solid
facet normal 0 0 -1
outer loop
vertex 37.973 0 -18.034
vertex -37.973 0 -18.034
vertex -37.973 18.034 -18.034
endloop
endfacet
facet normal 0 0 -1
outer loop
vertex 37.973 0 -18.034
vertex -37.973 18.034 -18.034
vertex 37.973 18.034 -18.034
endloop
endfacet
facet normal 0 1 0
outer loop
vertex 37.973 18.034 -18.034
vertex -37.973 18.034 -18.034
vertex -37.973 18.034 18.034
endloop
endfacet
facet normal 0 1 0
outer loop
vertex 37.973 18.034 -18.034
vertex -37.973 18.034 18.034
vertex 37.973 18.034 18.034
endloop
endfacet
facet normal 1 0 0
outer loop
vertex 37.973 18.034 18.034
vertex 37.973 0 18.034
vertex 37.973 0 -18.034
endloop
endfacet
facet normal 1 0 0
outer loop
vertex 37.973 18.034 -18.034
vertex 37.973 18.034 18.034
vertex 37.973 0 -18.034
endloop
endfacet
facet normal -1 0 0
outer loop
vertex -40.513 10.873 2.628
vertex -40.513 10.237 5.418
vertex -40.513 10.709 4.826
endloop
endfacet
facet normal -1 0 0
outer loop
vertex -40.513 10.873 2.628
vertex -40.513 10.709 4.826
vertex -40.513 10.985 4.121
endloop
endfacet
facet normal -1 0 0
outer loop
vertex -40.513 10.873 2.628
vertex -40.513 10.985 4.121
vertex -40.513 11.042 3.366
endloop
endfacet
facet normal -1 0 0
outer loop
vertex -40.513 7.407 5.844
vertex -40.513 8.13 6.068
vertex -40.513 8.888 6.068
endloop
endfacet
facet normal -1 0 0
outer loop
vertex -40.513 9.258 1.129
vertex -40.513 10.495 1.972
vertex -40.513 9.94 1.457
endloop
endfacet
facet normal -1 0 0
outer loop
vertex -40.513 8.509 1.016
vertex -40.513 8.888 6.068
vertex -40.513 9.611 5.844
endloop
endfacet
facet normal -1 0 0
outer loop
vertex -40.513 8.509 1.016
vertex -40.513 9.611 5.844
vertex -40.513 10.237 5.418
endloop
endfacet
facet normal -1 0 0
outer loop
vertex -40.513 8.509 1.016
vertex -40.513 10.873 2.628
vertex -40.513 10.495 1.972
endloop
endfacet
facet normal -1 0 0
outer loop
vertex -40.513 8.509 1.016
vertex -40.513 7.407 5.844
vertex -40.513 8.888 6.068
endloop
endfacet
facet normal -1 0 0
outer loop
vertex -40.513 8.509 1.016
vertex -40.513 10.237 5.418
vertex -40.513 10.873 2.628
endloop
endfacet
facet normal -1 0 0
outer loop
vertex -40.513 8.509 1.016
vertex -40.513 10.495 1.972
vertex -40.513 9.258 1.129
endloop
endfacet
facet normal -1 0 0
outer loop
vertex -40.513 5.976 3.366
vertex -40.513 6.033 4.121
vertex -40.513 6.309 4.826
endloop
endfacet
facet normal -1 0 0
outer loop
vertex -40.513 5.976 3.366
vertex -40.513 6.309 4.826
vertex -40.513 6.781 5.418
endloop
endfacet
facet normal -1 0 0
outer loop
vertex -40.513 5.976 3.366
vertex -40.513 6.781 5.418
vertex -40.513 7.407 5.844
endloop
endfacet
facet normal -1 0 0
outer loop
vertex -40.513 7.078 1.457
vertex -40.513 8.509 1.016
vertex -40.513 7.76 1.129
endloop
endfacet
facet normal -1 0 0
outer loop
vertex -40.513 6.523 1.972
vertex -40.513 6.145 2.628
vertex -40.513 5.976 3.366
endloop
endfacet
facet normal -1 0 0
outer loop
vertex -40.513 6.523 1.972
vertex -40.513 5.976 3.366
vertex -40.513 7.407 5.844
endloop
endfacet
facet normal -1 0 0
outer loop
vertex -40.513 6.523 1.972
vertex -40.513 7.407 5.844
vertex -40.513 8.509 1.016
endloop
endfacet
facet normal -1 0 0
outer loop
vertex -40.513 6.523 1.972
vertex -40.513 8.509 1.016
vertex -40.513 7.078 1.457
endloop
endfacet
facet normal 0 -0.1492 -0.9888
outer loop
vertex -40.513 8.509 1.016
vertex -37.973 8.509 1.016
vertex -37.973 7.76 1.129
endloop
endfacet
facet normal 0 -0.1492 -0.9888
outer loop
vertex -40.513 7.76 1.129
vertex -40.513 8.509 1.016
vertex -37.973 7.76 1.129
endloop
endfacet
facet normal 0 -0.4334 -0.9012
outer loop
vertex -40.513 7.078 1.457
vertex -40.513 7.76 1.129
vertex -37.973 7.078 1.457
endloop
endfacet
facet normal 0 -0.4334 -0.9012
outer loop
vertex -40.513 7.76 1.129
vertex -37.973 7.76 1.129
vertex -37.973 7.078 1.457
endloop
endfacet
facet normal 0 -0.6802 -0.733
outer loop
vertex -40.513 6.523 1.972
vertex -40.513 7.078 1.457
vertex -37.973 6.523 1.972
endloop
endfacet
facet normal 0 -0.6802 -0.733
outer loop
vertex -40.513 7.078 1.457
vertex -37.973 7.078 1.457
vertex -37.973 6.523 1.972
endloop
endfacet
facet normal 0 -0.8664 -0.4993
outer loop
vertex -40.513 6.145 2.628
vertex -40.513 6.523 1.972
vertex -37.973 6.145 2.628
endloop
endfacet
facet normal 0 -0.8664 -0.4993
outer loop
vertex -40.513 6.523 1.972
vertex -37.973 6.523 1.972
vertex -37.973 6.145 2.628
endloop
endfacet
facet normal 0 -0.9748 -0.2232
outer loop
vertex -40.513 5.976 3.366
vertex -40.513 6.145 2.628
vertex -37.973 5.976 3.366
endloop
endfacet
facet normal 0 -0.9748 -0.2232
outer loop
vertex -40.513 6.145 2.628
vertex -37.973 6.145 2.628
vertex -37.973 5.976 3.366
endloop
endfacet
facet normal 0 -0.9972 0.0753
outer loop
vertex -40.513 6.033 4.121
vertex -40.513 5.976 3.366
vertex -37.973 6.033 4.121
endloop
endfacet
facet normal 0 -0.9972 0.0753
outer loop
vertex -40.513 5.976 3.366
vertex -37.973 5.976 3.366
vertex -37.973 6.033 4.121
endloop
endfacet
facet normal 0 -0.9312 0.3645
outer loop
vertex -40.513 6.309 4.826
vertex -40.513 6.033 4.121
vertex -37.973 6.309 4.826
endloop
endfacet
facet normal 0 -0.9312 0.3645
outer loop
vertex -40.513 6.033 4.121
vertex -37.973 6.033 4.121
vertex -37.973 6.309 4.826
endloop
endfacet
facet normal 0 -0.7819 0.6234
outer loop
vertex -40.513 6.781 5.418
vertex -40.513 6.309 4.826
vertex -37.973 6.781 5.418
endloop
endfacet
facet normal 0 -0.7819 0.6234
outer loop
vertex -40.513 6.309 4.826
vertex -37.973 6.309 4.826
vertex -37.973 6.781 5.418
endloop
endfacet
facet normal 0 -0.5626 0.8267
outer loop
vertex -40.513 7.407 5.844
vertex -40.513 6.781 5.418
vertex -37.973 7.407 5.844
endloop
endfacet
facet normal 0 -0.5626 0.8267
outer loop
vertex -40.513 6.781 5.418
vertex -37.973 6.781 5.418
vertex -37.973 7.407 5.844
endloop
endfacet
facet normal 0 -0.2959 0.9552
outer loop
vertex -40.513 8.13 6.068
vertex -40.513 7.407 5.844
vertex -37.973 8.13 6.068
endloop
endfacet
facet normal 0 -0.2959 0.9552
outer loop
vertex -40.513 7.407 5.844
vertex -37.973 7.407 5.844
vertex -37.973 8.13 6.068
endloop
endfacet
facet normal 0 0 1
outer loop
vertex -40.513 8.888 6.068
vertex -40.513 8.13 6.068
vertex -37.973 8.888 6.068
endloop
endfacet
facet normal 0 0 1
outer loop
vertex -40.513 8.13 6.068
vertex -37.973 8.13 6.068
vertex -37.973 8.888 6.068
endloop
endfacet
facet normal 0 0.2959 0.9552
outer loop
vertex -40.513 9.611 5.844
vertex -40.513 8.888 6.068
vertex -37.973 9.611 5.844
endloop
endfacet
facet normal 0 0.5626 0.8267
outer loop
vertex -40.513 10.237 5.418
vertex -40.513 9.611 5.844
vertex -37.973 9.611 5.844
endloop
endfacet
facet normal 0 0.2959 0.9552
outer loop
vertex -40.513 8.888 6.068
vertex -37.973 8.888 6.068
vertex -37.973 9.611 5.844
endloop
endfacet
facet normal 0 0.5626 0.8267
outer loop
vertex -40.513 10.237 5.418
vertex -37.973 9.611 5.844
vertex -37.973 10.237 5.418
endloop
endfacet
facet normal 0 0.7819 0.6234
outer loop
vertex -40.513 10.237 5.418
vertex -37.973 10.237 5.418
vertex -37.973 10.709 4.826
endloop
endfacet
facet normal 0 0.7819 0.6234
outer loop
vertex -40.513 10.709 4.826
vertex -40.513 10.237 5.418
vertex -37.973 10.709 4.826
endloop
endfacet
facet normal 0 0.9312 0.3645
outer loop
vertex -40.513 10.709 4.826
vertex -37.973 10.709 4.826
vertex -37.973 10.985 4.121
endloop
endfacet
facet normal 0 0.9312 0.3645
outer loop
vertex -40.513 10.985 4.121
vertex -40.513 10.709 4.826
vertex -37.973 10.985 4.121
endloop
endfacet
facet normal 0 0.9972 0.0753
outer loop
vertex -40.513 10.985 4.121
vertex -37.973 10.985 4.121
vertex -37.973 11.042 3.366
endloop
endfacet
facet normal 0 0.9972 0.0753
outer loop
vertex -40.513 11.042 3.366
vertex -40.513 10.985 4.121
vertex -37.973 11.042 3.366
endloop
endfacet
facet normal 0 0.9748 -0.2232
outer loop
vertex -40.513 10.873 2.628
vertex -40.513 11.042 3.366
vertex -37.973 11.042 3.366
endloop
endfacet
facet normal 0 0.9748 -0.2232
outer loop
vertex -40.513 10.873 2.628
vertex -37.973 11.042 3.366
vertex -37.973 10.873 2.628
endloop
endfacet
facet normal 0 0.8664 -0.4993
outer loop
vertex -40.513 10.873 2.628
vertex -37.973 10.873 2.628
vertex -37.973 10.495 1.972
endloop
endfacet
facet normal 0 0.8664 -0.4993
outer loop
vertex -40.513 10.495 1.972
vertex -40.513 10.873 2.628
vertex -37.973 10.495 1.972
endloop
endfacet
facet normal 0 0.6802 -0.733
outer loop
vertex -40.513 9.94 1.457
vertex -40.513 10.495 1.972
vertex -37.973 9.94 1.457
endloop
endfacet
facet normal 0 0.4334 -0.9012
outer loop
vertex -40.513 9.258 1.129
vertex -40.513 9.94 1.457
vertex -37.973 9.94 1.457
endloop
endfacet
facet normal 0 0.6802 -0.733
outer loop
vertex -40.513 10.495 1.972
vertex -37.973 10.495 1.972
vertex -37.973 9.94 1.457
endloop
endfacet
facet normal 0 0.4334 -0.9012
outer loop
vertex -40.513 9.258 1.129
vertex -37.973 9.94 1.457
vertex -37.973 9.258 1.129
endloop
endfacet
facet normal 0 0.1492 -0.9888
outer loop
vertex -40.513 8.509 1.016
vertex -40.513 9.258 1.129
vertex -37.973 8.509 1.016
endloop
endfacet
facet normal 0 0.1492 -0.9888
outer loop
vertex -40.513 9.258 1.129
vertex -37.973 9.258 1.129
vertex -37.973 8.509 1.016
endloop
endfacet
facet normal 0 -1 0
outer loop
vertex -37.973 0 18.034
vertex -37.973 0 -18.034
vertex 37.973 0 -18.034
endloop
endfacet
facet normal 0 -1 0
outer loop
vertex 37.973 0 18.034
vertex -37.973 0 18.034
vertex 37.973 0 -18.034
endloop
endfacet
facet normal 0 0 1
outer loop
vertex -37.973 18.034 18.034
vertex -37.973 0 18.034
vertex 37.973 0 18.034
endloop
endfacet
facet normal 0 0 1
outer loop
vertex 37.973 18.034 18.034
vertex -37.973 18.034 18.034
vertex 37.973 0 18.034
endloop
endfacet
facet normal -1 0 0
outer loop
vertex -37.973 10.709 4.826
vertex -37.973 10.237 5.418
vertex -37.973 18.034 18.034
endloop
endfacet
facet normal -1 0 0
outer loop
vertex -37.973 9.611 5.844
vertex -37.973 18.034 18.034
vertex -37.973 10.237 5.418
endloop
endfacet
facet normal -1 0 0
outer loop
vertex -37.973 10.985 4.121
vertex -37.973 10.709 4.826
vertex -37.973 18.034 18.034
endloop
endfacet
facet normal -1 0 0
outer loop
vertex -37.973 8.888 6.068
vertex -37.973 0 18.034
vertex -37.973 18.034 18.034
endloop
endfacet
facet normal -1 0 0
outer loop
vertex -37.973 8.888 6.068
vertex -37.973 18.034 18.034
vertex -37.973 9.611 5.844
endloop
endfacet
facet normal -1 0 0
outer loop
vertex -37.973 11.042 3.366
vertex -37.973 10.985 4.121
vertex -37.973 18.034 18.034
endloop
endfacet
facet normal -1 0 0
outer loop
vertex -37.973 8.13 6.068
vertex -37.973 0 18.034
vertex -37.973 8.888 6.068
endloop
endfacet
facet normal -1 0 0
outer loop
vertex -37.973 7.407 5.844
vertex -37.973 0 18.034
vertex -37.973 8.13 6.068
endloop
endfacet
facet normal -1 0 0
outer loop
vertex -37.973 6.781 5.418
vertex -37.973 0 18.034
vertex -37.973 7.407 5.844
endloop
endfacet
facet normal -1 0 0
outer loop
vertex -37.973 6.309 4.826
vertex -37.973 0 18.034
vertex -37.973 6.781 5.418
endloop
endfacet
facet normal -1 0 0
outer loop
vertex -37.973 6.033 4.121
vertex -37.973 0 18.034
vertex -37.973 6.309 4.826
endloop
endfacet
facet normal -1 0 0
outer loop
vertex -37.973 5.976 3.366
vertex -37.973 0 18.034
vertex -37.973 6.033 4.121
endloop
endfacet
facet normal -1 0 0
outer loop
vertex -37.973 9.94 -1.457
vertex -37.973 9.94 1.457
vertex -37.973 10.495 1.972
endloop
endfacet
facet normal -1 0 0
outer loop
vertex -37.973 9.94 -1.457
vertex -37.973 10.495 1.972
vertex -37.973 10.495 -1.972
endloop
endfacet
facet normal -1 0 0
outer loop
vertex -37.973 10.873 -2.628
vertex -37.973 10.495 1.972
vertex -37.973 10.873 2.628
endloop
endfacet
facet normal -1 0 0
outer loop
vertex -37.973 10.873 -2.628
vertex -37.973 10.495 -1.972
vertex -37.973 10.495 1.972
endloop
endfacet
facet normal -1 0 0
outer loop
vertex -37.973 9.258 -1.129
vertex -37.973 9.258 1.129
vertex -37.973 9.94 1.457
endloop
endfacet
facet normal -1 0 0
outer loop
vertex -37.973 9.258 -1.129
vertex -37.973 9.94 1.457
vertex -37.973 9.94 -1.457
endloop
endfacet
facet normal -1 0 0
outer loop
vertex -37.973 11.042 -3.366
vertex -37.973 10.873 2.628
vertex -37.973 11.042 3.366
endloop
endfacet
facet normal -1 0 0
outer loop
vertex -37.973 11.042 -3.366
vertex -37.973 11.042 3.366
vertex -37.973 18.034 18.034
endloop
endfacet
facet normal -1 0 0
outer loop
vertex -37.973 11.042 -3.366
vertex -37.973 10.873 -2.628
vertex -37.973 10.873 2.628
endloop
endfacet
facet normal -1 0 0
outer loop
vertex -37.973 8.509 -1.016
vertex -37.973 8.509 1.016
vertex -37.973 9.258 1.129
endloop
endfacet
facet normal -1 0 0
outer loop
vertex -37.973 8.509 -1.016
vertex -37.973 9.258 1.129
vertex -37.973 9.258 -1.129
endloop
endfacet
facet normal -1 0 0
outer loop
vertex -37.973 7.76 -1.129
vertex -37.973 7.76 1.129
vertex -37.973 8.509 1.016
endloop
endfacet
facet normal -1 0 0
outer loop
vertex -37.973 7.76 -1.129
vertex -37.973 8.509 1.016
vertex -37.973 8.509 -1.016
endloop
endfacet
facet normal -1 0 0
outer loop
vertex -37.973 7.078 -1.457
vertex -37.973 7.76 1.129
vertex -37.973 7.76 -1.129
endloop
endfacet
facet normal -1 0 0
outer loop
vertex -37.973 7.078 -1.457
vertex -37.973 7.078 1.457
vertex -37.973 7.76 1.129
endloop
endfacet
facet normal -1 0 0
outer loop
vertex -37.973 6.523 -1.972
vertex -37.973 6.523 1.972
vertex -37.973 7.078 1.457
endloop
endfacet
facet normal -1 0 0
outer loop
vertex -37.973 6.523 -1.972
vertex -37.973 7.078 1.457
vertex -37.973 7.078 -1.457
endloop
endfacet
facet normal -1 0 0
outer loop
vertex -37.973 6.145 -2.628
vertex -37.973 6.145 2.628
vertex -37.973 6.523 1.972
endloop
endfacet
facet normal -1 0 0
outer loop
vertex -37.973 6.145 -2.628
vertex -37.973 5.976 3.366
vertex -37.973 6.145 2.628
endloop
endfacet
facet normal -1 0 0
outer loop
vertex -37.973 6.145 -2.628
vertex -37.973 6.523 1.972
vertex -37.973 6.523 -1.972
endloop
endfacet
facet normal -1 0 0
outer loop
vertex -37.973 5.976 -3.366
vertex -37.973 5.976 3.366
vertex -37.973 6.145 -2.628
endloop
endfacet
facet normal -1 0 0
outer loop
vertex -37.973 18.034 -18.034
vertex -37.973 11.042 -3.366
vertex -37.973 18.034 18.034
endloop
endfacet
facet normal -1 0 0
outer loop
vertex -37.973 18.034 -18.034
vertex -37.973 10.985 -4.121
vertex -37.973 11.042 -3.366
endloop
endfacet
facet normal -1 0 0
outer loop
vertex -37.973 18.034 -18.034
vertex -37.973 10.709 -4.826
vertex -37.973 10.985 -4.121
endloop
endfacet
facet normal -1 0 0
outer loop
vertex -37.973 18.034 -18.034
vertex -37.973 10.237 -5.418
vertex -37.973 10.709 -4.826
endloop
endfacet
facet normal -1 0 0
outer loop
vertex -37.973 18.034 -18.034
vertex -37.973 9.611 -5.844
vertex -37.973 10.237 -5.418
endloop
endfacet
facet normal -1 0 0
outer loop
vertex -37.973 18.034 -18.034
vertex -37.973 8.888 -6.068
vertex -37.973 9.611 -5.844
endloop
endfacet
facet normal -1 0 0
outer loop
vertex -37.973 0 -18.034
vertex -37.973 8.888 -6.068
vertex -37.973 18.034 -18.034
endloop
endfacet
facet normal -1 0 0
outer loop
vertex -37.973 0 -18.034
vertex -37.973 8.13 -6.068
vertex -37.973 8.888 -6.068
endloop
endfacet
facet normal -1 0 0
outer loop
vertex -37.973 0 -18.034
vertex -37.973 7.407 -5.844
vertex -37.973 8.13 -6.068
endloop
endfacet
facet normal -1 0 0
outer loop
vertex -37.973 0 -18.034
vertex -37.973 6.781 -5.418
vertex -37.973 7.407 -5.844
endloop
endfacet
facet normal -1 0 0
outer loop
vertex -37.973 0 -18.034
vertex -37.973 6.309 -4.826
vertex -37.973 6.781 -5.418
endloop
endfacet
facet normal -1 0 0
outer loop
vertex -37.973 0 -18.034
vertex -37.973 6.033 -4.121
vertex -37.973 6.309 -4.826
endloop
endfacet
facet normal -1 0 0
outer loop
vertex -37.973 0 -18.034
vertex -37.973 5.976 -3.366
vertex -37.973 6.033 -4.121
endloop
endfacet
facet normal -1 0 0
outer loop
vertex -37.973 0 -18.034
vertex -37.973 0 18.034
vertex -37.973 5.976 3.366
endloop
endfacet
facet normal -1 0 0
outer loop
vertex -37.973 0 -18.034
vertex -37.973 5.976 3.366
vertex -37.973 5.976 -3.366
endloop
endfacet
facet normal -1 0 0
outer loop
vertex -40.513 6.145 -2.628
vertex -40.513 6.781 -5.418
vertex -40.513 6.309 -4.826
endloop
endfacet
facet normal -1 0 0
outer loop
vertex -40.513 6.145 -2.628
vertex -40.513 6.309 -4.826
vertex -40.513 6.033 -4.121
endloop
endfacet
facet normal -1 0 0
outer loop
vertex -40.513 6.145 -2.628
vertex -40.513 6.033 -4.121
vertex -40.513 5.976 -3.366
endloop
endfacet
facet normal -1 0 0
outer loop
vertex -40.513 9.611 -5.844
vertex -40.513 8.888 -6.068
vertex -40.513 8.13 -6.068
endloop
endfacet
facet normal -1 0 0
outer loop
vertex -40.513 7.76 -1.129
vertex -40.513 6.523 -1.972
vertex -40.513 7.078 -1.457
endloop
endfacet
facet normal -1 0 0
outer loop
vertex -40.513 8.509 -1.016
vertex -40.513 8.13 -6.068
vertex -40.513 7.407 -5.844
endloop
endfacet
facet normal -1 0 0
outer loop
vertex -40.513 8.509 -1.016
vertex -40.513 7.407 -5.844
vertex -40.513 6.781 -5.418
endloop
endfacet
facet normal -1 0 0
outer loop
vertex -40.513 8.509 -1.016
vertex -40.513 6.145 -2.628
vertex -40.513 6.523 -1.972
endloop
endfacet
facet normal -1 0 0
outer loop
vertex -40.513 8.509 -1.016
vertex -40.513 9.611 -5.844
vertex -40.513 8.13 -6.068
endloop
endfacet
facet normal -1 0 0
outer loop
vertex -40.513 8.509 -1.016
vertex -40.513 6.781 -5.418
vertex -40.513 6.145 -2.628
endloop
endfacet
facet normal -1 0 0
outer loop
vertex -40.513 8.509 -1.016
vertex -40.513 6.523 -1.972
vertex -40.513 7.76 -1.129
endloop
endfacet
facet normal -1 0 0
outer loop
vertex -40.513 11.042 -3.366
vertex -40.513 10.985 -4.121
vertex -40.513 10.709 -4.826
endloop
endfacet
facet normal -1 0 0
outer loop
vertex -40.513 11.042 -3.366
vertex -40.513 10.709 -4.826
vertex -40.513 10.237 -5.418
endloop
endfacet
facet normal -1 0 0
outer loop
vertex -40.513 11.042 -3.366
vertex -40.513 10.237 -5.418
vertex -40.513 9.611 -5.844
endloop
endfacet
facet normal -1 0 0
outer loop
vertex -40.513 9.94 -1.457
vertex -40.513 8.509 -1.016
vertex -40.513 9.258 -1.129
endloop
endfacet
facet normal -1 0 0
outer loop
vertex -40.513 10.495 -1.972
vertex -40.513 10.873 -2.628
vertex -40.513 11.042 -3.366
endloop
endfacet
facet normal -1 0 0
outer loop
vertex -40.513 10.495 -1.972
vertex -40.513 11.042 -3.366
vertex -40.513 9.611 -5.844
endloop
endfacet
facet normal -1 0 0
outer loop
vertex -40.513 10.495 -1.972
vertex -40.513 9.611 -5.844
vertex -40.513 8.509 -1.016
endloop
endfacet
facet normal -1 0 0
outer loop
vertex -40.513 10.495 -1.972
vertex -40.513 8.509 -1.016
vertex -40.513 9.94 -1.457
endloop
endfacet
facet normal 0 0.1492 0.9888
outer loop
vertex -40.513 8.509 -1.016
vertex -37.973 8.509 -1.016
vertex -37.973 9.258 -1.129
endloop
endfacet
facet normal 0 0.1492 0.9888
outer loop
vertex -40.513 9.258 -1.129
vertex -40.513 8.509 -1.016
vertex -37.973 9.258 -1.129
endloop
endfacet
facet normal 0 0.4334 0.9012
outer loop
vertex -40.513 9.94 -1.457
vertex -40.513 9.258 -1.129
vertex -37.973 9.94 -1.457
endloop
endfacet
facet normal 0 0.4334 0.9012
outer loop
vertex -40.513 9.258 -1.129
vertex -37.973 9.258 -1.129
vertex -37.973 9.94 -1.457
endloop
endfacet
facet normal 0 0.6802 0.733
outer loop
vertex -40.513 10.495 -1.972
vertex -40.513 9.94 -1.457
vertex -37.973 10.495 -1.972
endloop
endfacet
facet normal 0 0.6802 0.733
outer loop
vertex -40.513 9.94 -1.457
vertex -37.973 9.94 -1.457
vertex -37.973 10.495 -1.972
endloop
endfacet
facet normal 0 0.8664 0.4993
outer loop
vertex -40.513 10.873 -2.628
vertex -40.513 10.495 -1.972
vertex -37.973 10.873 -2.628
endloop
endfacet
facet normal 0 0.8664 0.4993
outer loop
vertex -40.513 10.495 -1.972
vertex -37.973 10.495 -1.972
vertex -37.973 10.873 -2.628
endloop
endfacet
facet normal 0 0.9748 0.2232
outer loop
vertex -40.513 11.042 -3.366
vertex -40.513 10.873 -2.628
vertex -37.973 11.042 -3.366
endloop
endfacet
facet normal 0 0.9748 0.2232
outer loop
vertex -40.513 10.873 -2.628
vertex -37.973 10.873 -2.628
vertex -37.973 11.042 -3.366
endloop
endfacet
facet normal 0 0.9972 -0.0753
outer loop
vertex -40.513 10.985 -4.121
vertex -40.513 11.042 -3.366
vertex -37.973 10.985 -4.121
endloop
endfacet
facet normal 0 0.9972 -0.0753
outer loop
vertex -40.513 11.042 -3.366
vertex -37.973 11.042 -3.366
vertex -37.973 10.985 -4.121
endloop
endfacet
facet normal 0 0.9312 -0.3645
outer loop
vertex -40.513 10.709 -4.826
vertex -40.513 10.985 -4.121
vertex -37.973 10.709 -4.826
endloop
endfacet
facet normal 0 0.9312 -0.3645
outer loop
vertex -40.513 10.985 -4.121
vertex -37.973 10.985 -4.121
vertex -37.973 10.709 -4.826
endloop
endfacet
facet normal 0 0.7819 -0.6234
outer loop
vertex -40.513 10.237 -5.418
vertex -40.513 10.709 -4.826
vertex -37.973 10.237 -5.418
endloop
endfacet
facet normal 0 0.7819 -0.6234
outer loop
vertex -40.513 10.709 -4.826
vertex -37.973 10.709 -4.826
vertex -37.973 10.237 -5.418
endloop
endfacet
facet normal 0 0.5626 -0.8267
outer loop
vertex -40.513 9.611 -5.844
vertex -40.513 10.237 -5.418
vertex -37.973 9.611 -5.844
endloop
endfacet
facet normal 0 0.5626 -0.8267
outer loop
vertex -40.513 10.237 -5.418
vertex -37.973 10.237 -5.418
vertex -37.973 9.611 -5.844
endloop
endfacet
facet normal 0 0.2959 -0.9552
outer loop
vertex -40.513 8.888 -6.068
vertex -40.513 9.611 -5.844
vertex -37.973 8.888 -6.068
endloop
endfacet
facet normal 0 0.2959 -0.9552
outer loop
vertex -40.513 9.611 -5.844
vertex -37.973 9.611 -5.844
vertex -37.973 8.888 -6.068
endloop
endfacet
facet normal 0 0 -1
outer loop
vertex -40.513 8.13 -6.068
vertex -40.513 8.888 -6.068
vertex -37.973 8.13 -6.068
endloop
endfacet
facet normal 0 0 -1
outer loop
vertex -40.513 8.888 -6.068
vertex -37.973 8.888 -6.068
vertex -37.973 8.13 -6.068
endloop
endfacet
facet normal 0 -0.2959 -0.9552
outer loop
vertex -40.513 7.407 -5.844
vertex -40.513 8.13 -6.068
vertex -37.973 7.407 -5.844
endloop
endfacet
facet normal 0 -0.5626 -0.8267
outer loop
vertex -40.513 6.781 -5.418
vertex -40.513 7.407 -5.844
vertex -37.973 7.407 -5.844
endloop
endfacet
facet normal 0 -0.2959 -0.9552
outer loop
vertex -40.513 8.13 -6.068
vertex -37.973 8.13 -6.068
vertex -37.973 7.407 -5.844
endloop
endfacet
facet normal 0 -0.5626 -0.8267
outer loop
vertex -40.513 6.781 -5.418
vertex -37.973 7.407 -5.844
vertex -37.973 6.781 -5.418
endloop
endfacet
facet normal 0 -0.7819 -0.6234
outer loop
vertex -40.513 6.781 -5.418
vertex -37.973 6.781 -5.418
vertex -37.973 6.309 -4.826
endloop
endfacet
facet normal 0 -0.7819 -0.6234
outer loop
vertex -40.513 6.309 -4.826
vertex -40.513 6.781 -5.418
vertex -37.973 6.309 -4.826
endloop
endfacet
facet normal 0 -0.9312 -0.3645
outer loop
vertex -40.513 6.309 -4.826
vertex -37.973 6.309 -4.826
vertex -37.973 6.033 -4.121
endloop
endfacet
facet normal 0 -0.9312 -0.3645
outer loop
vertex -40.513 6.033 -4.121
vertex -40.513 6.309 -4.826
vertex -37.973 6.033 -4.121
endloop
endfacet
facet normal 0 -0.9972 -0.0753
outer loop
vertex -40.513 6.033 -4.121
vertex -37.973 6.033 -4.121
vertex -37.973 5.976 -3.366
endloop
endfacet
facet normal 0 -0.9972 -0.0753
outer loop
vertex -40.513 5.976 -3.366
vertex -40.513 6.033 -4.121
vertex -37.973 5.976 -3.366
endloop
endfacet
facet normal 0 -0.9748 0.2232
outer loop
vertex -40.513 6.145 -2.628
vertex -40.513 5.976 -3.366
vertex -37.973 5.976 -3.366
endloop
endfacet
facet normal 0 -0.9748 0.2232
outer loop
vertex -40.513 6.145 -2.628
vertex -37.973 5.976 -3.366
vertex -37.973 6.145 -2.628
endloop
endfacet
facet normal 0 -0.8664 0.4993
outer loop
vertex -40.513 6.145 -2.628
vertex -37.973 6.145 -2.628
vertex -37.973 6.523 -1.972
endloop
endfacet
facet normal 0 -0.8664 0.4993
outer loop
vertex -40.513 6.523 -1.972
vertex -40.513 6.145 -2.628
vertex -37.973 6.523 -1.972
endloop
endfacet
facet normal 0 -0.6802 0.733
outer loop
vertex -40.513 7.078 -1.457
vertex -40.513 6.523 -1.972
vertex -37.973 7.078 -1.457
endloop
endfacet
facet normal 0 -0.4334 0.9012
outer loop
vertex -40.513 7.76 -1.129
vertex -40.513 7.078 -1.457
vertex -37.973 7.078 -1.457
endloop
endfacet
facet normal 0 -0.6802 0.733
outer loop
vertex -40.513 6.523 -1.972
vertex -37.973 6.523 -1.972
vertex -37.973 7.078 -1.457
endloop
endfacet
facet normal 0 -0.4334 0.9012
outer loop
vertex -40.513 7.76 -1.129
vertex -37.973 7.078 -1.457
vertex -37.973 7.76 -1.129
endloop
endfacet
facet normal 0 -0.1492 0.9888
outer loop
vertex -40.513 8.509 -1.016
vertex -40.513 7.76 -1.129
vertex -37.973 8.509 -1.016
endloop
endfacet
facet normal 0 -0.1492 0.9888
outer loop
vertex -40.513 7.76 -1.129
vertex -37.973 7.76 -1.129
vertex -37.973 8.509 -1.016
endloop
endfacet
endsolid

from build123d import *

# Parameters (mm, degrees)
SKETCH1_W           = 75.946
SKETCH1_H           = 36.068
BOSS_EXTRUDE1_DEPTH = 18.034
SKETCH2_R           = 2.54
BOSS_EXTRUDE2_DEPTH = 2.54


with BuildPart() as part:
    # Sketch1 → Boss-Extrude1 (new body)
    with BuildSketch(Plane(origin=(0, 0, 0), x_dir=(1, 0, 0), z_dir=(0, 1, 0))):
        Rectangle(SKETCH1_W, SKETCH1_H)
    extrude(amount=BOSS_EXTRUDE1_DEPTH)

    # Sketch2 → Boss-Extrude2 (add)
    with BuildSketch(Plane.ZY.offset(37.973)):
        with Locations((-3.556, 8.509)):
            Circle(SKETCH2_R)
        with Locations(Location((3.556, 8.509, 0), (0, 0, 180))):
            Circle(SKETCH2_R)
    extrude(amount=BOSS_EXTRUDE2_DEPTH)


solid = part.part
